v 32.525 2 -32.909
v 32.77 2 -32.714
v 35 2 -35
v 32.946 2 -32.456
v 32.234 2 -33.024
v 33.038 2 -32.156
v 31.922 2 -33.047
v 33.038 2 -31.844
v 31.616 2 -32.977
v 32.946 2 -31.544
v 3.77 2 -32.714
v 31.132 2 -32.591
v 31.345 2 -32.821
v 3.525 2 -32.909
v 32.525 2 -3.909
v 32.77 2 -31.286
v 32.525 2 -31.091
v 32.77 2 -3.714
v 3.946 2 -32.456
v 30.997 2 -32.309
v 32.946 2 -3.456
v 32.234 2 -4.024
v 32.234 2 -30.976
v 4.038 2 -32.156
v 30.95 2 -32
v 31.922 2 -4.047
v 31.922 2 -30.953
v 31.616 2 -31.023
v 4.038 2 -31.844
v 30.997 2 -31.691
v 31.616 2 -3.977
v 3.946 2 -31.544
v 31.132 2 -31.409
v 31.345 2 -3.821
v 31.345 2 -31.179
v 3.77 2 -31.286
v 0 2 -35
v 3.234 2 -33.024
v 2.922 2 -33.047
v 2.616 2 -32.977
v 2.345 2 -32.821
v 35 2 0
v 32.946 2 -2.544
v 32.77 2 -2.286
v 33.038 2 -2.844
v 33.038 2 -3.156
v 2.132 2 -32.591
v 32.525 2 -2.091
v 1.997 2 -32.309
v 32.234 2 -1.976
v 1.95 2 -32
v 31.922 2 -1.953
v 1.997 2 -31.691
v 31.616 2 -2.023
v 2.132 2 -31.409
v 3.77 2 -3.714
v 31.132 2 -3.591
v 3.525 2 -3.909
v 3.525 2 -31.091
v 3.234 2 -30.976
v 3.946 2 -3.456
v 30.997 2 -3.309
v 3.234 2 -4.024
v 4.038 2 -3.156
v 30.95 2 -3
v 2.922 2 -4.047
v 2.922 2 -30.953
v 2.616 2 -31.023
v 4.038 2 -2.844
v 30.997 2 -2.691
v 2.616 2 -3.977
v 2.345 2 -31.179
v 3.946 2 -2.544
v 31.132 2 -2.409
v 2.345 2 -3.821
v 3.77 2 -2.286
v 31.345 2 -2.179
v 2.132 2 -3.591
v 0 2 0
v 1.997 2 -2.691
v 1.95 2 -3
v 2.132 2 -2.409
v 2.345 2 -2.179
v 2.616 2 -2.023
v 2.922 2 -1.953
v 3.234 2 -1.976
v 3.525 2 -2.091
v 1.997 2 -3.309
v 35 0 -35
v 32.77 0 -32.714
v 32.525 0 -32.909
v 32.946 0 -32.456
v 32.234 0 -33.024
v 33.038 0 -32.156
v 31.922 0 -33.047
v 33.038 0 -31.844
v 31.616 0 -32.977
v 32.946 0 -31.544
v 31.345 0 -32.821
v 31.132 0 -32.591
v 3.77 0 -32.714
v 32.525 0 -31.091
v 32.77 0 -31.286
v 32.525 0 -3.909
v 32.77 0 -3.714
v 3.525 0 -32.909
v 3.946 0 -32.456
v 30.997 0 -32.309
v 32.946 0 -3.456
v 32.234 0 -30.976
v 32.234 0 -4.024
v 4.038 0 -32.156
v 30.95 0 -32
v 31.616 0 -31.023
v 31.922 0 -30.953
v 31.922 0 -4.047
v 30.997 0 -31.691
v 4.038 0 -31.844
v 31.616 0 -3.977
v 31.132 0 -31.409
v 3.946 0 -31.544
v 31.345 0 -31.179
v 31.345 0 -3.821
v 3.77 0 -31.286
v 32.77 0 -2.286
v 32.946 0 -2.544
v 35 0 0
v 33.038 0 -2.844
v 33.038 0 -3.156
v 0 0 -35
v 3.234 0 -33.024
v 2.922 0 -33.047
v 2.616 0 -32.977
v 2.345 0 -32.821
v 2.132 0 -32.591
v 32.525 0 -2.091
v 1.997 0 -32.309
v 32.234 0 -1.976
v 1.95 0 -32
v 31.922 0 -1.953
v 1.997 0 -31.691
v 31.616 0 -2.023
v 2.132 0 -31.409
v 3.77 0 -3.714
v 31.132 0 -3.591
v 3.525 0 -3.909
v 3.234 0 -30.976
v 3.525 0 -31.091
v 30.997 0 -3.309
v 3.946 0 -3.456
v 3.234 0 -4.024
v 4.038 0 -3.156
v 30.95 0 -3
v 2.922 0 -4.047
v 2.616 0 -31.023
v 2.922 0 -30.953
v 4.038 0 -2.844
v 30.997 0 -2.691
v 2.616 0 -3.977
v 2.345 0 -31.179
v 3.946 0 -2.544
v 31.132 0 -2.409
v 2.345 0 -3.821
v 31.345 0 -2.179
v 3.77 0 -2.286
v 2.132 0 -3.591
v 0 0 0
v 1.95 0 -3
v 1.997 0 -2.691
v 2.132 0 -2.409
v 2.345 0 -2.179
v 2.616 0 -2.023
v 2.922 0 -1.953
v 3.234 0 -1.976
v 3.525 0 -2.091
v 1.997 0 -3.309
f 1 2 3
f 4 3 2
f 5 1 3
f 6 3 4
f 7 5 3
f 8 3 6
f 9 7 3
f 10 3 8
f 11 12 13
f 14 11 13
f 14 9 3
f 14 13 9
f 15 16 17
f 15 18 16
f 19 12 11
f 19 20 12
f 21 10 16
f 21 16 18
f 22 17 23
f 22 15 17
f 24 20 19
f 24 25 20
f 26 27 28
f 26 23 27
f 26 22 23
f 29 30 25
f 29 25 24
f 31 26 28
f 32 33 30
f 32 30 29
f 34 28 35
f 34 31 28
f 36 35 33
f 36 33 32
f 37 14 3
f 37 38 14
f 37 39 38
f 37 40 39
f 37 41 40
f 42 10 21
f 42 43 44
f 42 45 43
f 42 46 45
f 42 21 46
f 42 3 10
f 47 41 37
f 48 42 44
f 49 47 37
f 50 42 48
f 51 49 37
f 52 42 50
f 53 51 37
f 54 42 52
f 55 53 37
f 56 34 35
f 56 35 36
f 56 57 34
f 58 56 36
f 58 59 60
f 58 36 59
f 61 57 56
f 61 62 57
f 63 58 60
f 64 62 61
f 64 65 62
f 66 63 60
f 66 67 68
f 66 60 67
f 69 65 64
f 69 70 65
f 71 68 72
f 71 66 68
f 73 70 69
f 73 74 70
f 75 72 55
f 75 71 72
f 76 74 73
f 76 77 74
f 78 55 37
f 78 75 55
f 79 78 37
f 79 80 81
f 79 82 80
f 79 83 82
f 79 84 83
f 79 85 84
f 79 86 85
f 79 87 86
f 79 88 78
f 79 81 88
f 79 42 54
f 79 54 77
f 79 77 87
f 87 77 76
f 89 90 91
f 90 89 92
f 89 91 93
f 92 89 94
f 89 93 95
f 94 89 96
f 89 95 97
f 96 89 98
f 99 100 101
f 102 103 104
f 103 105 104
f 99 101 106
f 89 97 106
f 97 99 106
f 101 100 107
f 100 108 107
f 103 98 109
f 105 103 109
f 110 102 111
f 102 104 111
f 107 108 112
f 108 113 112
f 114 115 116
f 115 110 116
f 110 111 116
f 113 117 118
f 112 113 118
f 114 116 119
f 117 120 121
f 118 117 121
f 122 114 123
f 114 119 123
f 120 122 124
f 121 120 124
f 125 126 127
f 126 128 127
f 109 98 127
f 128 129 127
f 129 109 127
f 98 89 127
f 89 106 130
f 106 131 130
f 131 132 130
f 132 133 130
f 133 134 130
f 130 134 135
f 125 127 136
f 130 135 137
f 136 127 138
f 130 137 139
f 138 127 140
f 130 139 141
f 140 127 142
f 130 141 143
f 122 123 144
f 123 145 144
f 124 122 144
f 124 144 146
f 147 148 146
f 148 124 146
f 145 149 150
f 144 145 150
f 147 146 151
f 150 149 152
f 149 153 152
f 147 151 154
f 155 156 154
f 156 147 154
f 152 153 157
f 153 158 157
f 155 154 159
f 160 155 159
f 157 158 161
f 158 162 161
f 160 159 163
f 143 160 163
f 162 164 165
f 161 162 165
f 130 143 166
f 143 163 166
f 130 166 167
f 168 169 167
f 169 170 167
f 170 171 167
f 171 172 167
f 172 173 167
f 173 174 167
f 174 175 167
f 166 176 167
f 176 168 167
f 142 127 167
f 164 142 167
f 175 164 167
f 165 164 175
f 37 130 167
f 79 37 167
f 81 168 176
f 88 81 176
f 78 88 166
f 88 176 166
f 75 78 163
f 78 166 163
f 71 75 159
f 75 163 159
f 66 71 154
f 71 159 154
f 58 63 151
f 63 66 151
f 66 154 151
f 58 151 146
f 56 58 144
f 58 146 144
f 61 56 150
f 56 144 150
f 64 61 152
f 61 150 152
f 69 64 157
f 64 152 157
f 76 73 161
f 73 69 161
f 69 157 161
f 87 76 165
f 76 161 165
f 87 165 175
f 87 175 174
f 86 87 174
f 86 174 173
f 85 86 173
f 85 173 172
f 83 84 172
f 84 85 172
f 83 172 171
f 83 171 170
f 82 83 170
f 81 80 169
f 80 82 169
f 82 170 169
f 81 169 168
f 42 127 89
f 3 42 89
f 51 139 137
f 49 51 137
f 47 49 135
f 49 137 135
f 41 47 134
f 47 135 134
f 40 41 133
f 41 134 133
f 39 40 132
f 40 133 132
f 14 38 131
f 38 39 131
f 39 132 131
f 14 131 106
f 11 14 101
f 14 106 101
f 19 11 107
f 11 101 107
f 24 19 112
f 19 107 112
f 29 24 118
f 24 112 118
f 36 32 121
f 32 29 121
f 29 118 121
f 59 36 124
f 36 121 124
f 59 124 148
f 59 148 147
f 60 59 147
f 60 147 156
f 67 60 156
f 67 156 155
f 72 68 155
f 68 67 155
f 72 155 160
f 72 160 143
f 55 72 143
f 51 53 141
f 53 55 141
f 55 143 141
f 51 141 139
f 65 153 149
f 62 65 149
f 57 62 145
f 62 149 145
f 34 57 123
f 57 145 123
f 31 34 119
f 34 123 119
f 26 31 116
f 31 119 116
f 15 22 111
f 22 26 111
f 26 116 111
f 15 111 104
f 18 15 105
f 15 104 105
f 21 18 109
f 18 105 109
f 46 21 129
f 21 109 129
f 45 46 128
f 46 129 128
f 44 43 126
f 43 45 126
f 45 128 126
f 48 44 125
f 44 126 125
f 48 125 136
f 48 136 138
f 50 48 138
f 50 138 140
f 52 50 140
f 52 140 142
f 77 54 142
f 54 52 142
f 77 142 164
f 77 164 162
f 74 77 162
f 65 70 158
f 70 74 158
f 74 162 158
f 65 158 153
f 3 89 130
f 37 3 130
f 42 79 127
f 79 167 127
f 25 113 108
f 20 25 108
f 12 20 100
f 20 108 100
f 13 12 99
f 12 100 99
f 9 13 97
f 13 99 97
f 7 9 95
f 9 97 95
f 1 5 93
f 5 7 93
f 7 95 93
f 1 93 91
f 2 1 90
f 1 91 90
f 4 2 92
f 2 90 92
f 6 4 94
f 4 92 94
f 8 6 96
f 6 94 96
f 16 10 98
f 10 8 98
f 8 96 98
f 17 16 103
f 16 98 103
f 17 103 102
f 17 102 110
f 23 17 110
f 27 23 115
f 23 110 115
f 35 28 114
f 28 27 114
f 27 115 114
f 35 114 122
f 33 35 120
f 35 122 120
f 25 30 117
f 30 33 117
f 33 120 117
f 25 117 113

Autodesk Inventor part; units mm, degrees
ref_plane "YZ Plane" through (0, 0, 0) normal (1, 0, 0) x (0, 1, 0)
ref_plane "XZ Plane" through (0, 0, 0) normal (0, 1, 0) x (-1, 0, 0)
ref_plane "XY Plane" through (0, 0, 0) normal (0, 0, 1) x (1, 0, 0)
sketch "草图1" plane through (0, 0, 0) normal (0, 1, 0) x (-1, 0, 0)
  line L0 (0, 0) -> (-35, 0)
  line L1 (-35, 0) -> (-35, -35)
  line L2 (-35, -35) -> (0, -35)
  line L3 (0, -35) -> (0, 0)
  circle A0 centre (-3, -3) radius 1.05
  line L4 (0, -17.5) -> (-35, -17.5)
  line L5 (-17.5, 0) -> (-17.5, -35)
  circle A1 centre (-3, -32) radius 1.05
  circle A2 centre (-32, -3) radius 1.05
  circle A3 centre (-32, -32) radius 1.05
  dimension "d0" = 35
  dimension "d1" = 35
  dimension "d2" = 2.1
  dimension "d6" = 3
  dimension "d7" = 3
extrude "拉伸1" add sketch "草图1" along normal blind 2
properties part number "飞控外壳"
